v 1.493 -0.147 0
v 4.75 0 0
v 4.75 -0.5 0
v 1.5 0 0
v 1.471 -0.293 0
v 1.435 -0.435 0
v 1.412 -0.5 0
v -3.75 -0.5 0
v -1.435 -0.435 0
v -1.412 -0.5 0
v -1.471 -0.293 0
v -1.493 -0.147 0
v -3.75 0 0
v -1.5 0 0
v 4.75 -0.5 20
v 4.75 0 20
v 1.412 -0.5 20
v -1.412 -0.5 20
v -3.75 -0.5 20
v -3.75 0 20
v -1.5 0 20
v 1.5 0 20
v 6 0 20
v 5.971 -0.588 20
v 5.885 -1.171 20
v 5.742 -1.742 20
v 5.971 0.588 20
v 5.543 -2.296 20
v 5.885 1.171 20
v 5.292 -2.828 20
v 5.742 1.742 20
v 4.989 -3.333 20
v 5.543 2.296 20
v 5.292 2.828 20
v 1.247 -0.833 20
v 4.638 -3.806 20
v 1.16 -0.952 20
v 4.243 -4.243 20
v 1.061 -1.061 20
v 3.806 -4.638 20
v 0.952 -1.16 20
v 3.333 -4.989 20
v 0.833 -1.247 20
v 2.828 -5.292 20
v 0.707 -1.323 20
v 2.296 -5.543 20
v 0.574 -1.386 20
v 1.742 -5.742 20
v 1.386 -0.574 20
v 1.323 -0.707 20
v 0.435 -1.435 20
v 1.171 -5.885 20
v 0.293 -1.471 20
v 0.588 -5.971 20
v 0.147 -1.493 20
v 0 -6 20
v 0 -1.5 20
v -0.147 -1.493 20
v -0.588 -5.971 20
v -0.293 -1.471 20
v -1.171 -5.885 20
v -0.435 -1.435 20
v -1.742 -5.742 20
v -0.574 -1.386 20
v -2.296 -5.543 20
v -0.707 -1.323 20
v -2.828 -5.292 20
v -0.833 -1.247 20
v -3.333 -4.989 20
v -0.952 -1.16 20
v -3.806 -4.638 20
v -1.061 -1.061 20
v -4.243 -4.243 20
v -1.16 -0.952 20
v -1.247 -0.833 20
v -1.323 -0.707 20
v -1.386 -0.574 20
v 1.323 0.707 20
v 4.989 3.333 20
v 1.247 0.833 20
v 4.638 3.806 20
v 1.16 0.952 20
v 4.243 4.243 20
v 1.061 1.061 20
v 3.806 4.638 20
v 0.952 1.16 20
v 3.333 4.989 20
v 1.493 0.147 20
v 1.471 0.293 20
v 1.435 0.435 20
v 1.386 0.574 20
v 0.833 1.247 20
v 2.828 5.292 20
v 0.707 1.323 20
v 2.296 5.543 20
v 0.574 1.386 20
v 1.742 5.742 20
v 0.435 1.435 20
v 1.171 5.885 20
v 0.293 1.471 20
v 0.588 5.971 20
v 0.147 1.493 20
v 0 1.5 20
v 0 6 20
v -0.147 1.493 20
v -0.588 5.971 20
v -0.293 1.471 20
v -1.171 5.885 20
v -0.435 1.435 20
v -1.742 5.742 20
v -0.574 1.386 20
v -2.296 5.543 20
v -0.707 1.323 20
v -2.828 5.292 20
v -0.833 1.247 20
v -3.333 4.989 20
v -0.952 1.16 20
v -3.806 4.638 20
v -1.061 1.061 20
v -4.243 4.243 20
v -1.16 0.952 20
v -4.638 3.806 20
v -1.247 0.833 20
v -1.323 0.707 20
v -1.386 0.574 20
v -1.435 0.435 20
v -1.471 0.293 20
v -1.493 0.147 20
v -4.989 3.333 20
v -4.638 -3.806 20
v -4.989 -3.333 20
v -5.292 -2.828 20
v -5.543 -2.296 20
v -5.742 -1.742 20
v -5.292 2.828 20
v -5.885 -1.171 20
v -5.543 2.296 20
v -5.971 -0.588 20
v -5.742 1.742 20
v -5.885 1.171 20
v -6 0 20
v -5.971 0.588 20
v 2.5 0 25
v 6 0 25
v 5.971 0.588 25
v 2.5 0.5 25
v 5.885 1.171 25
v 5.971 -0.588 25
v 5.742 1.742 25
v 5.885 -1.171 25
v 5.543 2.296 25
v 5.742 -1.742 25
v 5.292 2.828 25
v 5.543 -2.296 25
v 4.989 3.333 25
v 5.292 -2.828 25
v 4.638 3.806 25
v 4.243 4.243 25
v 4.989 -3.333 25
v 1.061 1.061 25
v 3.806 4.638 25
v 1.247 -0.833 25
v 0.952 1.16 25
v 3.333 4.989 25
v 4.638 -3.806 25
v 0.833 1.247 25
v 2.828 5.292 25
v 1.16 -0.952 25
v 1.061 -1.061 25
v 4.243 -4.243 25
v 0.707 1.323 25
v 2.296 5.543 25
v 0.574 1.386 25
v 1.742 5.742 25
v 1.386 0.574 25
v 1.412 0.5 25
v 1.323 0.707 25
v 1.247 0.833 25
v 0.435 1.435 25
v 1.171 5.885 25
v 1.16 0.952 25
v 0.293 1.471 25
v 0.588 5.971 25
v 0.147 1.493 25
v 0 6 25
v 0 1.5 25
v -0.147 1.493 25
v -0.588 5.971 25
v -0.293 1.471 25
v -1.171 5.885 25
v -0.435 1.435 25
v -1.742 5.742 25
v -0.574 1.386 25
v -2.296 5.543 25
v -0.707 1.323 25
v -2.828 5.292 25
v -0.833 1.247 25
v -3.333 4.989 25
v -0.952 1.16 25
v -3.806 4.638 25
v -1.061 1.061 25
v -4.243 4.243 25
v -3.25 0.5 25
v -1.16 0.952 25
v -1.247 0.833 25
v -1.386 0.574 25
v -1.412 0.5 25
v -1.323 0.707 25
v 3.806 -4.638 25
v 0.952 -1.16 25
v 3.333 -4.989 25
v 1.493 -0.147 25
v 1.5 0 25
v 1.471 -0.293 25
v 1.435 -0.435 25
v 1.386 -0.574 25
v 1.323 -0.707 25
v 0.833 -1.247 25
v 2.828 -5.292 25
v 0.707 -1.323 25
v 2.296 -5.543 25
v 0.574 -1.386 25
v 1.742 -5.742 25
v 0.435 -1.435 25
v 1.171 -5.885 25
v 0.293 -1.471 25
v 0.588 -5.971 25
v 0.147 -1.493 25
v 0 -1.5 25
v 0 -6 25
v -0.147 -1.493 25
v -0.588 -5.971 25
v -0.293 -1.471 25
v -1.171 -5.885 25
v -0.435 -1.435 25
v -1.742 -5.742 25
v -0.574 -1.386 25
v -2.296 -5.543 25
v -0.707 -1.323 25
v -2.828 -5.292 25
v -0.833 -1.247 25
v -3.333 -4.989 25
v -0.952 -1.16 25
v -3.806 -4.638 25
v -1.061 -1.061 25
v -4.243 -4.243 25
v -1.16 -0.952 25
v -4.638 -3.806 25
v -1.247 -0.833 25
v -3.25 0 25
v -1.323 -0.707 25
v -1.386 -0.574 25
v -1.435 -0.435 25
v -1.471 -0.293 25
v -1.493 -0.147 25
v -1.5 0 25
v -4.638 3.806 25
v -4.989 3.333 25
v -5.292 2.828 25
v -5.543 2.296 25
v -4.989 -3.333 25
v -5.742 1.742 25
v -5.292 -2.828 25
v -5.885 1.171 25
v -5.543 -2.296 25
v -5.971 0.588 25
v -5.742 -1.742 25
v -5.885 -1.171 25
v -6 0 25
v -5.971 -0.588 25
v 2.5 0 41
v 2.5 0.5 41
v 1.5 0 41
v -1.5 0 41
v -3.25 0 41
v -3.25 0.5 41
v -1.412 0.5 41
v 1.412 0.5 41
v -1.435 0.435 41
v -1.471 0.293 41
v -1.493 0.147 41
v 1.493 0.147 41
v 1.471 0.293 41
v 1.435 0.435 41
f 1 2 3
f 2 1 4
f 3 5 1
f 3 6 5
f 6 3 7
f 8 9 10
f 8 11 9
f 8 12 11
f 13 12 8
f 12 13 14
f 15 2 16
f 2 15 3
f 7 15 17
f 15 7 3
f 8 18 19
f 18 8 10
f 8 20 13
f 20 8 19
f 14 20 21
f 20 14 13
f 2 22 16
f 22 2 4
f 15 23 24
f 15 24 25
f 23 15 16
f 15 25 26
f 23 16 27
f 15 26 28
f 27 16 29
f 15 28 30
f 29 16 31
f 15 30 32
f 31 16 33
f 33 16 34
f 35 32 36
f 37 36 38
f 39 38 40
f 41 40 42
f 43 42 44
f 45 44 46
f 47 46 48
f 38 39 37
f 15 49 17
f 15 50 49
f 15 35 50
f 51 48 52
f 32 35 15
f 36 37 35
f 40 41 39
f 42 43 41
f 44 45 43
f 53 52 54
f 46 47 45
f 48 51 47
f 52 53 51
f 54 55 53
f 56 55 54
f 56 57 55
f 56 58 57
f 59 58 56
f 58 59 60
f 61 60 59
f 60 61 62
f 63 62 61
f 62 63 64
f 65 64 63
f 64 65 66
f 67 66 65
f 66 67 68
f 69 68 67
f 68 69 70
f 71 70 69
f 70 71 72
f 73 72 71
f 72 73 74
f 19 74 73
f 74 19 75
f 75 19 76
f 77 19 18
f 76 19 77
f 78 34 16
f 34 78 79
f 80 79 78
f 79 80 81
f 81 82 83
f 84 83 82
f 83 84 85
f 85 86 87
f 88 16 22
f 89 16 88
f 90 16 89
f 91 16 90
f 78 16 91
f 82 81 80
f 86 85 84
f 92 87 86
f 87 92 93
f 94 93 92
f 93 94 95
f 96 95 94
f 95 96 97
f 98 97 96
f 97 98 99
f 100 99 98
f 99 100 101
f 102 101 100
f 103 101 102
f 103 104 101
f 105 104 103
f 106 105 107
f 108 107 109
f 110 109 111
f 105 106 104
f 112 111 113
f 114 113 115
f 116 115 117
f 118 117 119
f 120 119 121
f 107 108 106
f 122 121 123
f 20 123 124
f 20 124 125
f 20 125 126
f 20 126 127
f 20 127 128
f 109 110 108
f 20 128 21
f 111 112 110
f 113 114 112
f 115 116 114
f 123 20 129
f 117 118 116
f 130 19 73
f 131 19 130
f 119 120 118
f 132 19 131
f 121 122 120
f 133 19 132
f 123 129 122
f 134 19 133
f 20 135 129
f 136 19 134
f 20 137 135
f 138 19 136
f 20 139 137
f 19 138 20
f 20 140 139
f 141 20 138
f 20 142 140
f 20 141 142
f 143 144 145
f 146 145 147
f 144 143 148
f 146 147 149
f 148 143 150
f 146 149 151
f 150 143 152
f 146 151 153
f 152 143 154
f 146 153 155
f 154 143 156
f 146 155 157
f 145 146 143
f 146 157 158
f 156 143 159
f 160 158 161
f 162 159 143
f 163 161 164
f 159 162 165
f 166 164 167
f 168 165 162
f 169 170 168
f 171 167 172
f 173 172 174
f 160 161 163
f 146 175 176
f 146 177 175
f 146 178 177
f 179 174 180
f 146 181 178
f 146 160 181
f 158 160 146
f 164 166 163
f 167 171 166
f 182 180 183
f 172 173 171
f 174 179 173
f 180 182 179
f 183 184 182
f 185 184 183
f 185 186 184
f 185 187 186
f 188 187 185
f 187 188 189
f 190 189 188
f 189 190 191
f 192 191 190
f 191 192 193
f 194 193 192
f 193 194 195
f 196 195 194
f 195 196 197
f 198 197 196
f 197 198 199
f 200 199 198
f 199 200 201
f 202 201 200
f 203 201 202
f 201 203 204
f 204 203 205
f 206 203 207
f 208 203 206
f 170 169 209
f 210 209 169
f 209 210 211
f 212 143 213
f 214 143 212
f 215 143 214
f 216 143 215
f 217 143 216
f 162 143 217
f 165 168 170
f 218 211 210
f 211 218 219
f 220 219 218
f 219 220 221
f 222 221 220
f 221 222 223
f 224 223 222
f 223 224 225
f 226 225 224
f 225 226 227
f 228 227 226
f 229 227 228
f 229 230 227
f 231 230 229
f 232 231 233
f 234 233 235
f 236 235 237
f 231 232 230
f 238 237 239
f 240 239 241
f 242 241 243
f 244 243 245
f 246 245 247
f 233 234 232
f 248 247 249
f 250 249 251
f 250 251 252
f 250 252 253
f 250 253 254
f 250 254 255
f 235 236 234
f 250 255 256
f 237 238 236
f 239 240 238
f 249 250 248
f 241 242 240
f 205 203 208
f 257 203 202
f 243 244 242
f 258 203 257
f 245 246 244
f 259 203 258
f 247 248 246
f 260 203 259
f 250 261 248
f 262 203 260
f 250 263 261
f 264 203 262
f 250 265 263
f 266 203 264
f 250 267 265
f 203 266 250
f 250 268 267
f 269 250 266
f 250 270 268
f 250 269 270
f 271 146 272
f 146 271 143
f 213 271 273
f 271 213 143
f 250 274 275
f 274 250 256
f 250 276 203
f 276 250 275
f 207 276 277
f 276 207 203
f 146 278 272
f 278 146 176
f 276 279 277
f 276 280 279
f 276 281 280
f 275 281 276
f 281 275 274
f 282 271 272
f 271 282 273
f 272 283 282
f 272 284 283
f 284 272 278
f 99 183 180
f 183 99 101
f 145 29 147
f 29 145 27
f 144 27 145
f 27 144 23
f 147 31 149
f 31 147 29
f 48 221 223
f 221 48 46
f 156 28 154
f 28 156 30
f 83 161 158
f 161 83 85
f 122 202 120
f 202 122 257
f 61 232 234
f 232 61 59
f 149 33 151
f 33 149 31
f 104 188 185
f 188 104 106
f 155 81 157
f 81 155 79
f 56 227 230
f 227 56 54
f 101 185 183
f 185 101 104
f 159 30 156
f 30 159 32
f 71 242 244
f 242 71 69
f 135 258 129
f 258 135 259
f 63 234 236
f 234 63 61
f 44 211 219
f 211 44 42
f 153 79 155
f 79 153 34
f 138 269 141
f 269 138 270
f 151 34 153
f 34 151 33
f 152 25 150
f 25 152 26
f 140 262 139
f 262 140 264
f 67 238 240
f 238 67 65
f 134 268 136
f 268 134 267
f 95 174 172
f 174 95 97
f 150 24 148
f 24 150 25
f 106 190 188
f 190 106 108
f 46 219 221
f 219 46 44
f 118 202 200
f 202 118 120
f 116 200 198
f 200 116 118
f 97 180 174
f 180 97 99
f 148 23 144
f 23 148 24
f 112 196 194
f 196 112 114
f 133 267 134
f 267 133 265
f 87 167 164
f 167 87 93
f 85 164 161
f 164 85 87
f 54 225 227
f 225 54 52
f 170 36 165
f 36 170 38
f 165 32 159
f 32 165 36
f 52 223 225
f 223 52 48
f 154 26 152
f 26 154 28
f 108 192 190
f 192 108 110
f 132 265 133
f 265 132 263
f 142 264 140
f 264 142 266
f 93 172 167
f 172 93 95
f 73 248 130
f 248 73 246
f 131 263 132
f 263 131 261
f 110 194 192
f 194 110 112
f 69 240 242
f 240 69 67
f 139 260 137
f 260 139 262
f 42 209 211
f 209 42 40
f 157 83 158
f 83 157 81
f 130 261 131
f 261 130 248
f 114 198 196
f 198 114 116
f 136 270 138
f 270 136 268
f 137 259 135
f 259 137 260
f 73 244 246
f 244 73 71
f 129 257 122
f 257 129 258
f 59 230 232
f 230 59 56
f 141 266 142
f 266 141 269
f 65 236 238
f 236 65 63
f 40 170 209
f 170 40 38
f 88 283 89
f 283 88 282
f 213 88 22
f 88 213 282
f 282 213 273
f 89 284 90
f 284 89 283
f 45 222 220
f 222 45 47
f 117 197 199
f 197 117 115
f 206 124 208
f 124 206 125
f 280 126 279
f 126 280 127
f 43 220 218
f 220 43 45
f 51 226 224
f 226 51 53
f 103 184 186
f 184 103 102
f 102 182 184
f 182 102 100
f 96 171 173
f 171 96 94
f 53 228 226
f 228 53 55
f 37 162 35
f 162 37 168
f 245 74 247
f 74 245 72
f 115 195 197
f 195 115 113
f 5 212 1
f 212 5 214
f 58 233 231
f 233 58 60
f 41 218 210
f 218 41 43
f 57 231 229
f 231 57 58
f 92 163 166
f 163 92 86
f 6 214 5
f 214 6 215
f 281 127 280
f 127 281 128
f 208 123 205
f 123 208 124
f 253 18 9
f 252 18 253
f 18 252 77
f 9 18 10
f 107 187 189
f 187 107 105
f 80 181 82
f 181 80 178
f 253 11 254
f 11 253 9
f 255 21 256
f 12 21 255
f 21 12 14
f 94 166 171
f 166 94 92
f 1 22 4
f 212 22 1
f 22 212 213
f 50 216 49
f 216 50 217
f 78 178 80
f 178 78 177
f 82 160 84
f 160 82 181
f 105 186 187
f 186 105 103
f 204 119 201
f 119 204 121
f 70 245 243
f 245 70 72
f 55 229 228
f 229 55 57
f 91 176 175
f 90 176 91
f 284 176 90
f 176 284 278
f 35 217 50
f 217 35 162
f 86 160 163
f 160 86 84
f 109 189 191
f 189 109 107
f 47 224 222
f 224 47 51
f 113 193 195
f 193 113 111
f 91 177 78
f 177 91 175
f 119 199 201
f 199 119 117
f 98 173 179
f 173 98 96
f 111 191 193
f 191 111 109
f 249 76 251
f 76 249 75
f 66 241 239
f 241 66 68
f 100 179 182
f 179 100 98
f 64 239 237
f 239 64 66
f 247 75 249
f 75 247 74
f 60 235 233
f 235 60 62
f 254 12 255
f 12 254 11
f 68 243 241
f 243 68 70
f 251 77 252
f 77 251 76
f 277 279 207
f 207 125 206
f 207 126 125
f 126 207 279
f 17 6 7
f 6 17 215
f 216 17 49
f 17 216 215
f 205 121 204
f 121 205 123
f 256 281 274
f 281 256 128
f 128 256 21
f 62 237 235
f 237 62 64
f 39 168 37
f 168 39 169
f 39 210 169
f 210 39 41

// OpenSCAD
// Hose-barb reducer: 8 mm tubing (barbs A) -> collar -> 5 mm tubing (barbs B)
// Print orientation: standing upright along +Z, centred on origin in X/Y

$fn = 64;

// ---- Dimensions (mm) ----
bore      = 3;    // through-bore diameter
barb_a_h  = 10;   // height of each 8 mm barb
barb_a_d  = 7.5;  // outer diameter of 8 mm barb (bottom)
barb_a_t  = 9.5;  // outer diameter of 8 mm barb (top)
collar_d  = 12;   // collar diameter (z = 20 to 25)
barb_b_h  = 8;    // height of each 5 mm barb
barb_b_d  = 6.5;  // outer diameter of 5 mm barb (bottom)
barb_b_t  = 5;    // outer diameter of 5 mm barb (top)
eps       = 0.5;  // overcut for clean differences

// ---- Derived ----
z0 = 0;
z_a = 20;         // top of 8 mm barbs
z_c = 25;         // top of collar / bottom of 5 mm barbs
z1 = 41;          // top of 5 mm barbs
n   = 2;          // number of stacked barbs on each side

// ---- Model ----
difference() {
    union() {
        // Barbs for 8 mm tubing
        for (i = [0 : n - 1])
            translate([0, 0, z0 + i * barb_a_h])
                linear_extrude(height = barb_a_h)
                    polygon([
                        [-barb_a_d / 2, 0],
                        [ barb_a_t / 2, 0],
                        [ barb_a_t / 2, -eps],
                        [-barb_a_d / 2, -eps]
                    ]);

        // Collar
        translate([0, 0, z_a])
            cylinder(d = collar_d, h = 5);

        // Barbs for 5 mm tubing
        for (i = [0 : n - 1])
            translate([0, 0, z_c + i * barb_b_h])
                linear_extrude(height = barb_b_h)
                    polygon([
                        [-barb_b_d / 2, 0],
                        [ barb_b_t / 2, 0],
                        [ barb_b_t / 2, eps],
                        [-barb_b_d / 2, eps]
                    ]);
    }

    // Full-length bore
    translate([0, 0, -eps])
        cylinder(d = bore, h = z1 + 2 * eps);
}
